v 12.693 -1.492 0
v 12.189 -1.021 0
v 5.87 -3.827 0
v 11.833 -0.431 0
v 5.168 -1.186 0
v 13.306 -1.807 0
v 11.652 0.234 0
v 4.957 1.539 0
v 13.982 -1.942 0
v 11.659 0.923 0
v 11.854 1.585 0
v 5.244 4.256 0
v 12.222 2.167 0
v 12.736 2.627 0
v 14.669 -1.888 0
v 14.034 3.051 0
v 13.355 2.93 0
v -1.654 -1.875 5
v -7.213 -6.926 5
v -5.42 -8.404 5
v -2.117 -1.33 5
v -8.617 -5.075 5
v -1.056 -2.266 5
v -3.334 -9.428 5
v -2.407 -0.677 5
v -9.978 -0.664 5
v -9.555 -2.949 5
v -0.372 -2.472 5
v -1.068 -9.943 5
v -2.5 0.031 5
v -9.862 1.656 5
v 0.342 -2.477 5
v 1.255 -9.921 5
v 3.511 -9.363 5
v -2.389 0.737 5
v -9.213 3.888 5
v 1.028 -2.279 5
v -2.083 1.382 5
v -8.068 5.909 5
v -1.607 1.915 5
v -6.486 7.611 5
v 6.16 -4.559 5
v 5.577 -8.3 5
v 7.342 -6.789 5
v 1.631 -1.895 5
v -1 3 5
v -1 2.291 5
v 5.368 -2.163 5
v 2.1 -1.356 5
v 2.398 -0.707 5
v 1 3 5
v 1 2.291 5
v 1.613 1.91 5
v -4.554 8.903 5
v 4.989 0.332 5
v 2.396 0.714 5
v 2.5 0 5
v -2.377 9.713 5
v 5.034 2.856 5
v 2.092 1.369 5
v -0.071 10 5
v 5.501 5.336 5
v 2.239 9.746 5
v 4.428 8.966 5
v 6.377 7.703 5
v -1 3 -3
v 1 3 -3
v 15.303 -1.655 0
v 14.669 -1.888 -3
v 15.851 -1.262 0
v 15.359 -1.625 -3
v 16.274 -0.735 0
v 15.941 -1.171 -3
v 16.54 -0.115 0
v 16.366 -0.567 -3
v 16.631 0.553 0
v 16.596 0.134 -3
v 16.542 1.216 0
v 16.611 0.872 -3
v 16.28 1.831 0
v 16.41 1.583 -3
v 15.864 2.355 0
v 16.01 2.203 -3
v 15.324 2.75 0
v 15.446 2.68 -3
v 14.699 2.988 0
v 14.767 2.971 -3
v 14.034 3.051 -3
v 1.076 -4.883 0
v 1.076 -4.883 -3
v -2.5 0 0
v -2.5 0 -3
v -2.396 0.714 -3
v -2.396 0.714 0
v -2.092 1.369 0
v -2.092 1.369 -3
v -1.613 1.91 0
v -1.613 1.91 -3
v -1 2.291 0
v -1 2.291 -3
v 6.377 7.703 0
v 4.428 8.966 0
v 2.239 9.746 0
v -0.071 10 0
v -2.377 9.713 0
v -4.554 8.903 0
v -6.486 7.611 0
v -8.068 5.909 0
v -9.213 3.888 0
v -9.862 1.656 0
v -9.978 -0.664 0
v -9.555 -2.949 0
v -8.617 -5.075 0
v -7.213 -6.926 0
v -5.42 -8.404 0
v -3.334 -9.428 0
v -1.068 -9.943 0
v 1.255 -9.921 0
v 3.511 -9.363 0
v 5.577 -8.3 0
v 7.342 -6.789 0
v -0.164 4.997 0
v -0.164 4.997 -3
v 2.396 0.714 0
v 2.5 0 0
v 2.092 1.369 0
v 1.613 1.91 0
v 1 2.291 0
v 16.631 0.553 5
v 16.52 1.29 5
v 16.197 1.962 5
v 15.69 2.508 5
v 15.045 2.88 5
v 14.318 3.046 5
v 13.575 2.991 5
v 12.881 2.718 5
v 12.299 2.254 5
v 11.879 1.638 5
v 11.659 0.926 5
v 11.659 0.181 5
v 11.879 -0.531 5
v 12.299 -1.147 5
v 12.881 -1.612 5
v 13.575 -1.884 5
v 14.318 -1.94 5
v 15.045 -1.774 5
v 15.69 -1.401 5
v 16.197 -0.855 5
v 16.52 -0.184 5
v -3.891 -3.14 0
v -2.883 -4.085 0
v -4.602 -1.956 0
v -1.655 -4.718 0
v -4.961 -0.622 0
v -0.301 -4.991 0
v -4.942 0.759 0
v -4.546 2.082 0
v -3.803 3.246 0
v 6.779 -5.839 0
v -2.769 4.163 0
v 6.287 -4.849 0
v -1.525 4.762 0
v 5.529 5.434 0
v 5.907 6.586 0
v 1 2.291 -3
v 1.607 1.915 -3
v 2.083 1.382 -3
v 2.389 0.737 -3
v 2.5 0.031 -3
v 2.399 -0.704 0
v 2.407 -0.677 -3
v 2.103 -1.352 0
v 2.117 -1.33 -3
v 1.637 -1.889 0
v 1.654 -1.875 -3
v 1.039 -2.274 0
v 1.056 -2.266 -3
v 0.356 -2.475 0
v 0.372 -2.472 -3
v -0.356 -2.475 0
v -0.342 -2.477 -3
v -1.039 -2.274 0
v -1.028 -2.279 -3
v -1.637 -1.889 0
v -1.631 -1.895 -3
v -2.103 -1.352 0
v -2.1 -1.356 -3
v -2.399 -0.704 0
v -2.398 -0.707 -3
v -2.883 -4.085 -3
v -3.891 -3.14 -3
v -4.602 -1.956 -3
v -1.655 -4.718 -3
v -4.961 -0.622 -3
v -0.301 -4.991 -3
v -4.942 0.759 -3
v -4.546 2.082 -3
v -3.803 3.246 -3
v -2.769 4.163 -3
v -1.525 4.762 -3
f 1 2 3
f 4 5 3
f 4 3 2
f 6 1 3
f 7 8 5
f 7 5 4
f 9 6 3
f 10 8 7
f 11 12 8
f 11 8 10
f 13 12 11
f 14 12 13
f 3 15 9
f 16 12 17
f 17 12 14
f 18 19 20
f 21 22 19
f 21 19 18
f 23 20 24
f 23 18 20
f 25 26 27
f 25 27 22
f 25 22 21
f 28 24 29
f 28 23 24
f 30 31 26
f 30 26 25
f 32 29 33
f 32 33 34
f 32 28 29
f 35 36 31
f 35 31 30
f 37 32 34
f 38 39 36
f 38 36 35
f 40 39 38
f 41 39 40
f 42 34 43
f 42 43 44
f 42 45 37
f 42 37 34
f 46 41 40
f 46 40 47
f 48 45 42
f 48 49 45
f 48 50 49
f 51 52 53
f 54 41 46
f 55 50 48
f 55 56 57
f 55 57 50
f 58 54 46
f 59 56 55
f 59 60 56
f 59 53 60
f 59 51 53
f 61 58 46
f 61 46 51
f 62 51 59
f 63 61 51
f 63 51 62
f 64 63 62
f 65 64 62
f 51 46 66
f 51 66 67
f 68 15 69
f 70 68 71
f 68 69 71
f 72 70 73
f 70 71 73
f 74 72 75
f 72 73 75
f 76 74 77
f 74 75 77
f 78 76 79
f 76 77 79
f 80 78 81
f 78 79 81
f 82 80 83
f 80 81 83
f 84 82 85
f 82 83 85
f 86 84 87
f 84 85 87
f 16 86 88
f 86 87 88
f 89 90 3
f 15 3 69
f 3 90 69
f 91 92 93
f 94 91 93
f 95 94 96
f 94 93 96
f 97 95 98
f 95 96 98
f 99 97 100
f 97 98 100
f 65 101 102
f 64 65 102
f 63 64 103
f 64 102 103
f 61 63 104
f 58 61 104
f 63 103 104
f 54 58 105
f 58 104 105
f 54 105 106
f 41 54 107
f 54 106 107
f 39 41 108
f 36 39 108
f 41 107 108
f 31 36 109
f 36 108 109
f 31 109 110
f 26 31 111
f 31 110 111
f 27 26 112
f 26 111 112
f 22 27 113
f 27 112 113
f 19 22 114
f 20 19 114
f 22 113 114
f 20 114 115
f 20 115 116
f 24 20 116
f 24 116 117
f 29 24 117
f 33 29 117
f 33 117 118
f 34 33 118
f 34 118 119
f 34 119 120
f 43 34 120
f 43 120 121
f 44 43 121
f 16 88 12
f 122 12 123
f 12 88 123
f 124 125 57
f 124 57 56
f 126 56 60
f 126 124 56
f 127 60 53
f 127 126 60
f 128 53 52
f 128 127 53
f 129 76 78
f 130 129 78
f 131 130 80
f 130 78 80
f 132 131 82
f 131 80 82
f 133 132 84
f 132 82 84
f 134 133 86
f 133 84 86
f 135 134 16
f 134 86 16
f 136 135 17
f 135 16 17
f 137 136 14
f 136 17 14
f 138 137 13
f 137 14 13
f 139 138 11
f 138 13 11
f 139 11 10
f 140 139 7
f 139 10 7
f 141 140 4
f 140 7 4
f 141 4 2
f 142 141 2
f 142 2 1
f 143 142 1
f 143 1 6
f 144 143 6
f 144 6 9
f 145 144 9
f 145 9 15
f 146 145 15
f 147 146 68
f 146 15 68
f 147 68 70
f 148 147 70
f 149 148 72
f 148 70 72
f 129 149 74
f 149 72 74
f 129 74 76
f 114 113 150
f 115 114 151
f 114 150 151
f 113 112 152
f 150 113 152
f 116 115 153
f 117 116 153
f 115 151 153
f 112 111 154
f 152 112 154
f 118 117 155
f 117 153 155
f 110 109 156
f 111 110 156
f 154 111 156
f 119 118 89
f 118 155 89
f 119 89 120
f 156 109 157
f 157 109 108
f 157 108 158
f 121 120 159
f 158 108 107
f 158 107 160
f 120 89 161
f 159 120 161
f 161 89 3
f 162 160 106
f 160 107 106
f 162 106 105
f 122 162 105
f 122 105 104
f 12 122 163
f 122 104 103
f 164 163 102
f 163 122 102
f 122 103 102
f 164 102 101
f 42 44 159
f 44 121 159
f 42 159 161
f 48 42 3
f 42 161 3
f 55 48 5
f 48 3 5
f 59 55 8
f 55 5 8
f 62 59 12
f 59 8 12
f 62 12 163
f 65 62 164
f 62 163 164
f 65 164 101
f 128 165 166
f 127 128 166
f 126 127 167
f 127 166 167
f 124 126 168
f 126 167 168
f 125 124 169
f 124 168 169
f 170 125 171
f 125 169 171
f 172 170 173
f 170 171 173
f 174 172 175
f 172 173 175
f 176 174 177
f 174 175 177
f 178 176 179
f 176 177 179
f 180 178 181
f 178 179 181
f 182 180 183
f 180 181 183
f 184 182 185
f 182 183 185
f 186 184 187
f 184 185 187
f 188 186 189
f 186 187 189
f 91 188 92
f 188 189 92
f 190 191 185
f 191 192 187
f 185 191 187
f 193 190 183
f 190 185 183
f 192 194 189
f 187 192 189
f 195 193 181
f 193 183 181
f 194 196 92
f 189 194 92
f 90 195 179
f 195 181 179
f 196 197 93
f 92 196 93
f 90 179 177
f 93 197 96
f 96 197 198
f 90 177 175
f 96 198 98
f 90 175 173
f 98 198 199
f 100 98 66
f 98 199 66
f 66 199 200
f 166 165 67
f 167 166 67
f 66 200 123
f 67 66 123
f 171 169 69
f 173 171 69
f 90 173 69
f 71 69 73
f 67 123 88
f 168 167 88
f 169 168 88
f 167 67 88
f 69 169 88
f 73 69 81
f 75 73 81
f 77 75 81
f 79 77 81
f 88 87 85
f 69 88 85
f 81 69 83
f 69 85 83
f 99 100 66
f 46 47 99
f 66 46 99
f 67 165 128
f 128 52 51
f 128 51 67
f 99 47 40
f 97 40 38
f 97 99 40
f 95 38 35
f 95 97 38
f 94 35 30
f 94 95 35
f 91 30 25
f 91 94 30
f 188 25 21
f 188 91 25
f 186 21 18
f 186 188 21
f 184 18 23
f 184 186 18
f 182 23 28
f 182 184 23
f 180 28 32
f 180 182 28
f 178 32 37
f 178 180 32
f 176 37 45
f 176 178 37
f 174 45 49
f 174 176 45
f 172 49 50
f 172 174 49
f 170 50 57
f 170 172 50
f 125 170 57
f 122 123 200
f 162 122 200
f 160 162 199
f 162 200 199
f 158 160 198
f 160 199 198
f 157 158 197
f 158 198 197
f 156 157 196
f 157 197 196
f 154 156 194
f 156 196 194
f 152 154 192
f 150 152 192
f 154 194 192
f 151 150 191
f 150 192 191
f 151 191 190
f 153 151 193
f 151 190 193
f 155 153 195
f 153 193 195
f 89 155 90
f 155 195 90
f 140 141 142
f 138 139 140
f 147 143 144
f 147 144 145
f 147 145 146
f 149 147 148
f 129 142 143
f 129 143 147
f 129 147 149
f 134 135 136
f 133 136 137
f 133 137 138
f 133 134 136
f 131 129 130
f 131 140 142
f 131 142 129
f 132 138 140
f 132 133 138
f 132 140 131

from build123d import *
from build123d.topology import SkipClean

# Parameters (mm, degrees)
SKETCH_1_R          = 10
SKETCH_1_R_2        = 2.5
EXTRUDE_1_DEPTH     = 5
SKETCH_2_R          = 15
CUT_EXTRUDE_1_DEPTH = 5
EXTRUDE_START       = 3
SKETCH_3_R          = 2.5
EXTRUDE_2_DEPTH     = 3
SKETCH_4_R          = 2.5
EXTRUDE_3_DEPTH     = 5
SKETCH_5_W          = 2
SKETCH_5_H          = 1
CUT_EXTRUDE_2_DEPTH = 21.990484753


with BuildPart() as part:
    # 草图1 → 凸台-拉伸1 (new body)
    with BuildSketch(Plane.XY):
        Circle(SKETCH_1_R)
        Circle(SKETCH_1_R_2, mode=Mode.SUBTRACT)
    extrude(amount=EXTRUDE_1_DEPTH)

    # 草图2 → 切除-拉伸1 (cut)
    with BuildSketch(Plane(origin=(0, 0, 0), x_dir=(-1, 0, 0), z_dir=(0, 0, -1))):
        with Locations((-19.955808724, 1.328795767)):
            Circle(SKETCH_2_R)
    extrude(amount=-CUT_EXTRUDE_1_DEPTH, mode=Mode.SUBTRACT)

    # 草图3 → 凸台-拉伸2 (add)
    with SkipClean():  # the faces are left unmerged after this step: merging them gives an invalid solid
        with BuildSketch(Plane(origin=(0, 0, 0), x_dir=(-1, 0, 0), z_dir=(0, 0, -1)).offset(EXTRUDE_START)):
            with BuildLine():
                Line((-14.033505879, 3.051346054), (0.163638991, 4.997321511))
                ThreePointArc((0.163638991, 4.997321511), (4.961120501, -0.622320962), (-1.075733127, -4.882908789))
                Line((-1.075733127, -4.882908789), (-14.669175898, -1.888194504))
                ThreePointArc((-14.669175898, -1.888194504), (-16.610861535, 0.872353736), (-14.033505879, 3.051346054))
            make_face()
            Circle(SKETCH_3_R, mode=Mode.SUBTRACT)
        extrude(amount=-EXTRUDE_2_DEPTH)

    # 草图4 → 凸台-拉伸3 (add)
    with SkipClean():  # the faces are left unmerged after this step: merging them gives an invalid solid
        with BuildSketch(Plane.XY):
            with Locations((14.131309334, 0.55325989)):
                Circle(SKETCH_4_R)
        extrude(amount=EXTRUDE_3_DEPTH)

    # 草图5 → 切除-拉伸2 (cut, through all)
    with SkipClean():  # the faces are left unmerged after this step: merging them gives an invalid solid
        with BuildSketch(Plane.XY.offset(5)):
            with Locations((0, 2.5)):
                Rectangle(SKETCH_5_W, SKETCH_5_H)
        extrude(amount=-CUT_EXTRUDE_2_DEPTH, mode=Mode.SUBTRACT)
    add(part.part.scale(1), mode=Mode.REPLACE)  # the faces are merged on a copy


solid = part.part
